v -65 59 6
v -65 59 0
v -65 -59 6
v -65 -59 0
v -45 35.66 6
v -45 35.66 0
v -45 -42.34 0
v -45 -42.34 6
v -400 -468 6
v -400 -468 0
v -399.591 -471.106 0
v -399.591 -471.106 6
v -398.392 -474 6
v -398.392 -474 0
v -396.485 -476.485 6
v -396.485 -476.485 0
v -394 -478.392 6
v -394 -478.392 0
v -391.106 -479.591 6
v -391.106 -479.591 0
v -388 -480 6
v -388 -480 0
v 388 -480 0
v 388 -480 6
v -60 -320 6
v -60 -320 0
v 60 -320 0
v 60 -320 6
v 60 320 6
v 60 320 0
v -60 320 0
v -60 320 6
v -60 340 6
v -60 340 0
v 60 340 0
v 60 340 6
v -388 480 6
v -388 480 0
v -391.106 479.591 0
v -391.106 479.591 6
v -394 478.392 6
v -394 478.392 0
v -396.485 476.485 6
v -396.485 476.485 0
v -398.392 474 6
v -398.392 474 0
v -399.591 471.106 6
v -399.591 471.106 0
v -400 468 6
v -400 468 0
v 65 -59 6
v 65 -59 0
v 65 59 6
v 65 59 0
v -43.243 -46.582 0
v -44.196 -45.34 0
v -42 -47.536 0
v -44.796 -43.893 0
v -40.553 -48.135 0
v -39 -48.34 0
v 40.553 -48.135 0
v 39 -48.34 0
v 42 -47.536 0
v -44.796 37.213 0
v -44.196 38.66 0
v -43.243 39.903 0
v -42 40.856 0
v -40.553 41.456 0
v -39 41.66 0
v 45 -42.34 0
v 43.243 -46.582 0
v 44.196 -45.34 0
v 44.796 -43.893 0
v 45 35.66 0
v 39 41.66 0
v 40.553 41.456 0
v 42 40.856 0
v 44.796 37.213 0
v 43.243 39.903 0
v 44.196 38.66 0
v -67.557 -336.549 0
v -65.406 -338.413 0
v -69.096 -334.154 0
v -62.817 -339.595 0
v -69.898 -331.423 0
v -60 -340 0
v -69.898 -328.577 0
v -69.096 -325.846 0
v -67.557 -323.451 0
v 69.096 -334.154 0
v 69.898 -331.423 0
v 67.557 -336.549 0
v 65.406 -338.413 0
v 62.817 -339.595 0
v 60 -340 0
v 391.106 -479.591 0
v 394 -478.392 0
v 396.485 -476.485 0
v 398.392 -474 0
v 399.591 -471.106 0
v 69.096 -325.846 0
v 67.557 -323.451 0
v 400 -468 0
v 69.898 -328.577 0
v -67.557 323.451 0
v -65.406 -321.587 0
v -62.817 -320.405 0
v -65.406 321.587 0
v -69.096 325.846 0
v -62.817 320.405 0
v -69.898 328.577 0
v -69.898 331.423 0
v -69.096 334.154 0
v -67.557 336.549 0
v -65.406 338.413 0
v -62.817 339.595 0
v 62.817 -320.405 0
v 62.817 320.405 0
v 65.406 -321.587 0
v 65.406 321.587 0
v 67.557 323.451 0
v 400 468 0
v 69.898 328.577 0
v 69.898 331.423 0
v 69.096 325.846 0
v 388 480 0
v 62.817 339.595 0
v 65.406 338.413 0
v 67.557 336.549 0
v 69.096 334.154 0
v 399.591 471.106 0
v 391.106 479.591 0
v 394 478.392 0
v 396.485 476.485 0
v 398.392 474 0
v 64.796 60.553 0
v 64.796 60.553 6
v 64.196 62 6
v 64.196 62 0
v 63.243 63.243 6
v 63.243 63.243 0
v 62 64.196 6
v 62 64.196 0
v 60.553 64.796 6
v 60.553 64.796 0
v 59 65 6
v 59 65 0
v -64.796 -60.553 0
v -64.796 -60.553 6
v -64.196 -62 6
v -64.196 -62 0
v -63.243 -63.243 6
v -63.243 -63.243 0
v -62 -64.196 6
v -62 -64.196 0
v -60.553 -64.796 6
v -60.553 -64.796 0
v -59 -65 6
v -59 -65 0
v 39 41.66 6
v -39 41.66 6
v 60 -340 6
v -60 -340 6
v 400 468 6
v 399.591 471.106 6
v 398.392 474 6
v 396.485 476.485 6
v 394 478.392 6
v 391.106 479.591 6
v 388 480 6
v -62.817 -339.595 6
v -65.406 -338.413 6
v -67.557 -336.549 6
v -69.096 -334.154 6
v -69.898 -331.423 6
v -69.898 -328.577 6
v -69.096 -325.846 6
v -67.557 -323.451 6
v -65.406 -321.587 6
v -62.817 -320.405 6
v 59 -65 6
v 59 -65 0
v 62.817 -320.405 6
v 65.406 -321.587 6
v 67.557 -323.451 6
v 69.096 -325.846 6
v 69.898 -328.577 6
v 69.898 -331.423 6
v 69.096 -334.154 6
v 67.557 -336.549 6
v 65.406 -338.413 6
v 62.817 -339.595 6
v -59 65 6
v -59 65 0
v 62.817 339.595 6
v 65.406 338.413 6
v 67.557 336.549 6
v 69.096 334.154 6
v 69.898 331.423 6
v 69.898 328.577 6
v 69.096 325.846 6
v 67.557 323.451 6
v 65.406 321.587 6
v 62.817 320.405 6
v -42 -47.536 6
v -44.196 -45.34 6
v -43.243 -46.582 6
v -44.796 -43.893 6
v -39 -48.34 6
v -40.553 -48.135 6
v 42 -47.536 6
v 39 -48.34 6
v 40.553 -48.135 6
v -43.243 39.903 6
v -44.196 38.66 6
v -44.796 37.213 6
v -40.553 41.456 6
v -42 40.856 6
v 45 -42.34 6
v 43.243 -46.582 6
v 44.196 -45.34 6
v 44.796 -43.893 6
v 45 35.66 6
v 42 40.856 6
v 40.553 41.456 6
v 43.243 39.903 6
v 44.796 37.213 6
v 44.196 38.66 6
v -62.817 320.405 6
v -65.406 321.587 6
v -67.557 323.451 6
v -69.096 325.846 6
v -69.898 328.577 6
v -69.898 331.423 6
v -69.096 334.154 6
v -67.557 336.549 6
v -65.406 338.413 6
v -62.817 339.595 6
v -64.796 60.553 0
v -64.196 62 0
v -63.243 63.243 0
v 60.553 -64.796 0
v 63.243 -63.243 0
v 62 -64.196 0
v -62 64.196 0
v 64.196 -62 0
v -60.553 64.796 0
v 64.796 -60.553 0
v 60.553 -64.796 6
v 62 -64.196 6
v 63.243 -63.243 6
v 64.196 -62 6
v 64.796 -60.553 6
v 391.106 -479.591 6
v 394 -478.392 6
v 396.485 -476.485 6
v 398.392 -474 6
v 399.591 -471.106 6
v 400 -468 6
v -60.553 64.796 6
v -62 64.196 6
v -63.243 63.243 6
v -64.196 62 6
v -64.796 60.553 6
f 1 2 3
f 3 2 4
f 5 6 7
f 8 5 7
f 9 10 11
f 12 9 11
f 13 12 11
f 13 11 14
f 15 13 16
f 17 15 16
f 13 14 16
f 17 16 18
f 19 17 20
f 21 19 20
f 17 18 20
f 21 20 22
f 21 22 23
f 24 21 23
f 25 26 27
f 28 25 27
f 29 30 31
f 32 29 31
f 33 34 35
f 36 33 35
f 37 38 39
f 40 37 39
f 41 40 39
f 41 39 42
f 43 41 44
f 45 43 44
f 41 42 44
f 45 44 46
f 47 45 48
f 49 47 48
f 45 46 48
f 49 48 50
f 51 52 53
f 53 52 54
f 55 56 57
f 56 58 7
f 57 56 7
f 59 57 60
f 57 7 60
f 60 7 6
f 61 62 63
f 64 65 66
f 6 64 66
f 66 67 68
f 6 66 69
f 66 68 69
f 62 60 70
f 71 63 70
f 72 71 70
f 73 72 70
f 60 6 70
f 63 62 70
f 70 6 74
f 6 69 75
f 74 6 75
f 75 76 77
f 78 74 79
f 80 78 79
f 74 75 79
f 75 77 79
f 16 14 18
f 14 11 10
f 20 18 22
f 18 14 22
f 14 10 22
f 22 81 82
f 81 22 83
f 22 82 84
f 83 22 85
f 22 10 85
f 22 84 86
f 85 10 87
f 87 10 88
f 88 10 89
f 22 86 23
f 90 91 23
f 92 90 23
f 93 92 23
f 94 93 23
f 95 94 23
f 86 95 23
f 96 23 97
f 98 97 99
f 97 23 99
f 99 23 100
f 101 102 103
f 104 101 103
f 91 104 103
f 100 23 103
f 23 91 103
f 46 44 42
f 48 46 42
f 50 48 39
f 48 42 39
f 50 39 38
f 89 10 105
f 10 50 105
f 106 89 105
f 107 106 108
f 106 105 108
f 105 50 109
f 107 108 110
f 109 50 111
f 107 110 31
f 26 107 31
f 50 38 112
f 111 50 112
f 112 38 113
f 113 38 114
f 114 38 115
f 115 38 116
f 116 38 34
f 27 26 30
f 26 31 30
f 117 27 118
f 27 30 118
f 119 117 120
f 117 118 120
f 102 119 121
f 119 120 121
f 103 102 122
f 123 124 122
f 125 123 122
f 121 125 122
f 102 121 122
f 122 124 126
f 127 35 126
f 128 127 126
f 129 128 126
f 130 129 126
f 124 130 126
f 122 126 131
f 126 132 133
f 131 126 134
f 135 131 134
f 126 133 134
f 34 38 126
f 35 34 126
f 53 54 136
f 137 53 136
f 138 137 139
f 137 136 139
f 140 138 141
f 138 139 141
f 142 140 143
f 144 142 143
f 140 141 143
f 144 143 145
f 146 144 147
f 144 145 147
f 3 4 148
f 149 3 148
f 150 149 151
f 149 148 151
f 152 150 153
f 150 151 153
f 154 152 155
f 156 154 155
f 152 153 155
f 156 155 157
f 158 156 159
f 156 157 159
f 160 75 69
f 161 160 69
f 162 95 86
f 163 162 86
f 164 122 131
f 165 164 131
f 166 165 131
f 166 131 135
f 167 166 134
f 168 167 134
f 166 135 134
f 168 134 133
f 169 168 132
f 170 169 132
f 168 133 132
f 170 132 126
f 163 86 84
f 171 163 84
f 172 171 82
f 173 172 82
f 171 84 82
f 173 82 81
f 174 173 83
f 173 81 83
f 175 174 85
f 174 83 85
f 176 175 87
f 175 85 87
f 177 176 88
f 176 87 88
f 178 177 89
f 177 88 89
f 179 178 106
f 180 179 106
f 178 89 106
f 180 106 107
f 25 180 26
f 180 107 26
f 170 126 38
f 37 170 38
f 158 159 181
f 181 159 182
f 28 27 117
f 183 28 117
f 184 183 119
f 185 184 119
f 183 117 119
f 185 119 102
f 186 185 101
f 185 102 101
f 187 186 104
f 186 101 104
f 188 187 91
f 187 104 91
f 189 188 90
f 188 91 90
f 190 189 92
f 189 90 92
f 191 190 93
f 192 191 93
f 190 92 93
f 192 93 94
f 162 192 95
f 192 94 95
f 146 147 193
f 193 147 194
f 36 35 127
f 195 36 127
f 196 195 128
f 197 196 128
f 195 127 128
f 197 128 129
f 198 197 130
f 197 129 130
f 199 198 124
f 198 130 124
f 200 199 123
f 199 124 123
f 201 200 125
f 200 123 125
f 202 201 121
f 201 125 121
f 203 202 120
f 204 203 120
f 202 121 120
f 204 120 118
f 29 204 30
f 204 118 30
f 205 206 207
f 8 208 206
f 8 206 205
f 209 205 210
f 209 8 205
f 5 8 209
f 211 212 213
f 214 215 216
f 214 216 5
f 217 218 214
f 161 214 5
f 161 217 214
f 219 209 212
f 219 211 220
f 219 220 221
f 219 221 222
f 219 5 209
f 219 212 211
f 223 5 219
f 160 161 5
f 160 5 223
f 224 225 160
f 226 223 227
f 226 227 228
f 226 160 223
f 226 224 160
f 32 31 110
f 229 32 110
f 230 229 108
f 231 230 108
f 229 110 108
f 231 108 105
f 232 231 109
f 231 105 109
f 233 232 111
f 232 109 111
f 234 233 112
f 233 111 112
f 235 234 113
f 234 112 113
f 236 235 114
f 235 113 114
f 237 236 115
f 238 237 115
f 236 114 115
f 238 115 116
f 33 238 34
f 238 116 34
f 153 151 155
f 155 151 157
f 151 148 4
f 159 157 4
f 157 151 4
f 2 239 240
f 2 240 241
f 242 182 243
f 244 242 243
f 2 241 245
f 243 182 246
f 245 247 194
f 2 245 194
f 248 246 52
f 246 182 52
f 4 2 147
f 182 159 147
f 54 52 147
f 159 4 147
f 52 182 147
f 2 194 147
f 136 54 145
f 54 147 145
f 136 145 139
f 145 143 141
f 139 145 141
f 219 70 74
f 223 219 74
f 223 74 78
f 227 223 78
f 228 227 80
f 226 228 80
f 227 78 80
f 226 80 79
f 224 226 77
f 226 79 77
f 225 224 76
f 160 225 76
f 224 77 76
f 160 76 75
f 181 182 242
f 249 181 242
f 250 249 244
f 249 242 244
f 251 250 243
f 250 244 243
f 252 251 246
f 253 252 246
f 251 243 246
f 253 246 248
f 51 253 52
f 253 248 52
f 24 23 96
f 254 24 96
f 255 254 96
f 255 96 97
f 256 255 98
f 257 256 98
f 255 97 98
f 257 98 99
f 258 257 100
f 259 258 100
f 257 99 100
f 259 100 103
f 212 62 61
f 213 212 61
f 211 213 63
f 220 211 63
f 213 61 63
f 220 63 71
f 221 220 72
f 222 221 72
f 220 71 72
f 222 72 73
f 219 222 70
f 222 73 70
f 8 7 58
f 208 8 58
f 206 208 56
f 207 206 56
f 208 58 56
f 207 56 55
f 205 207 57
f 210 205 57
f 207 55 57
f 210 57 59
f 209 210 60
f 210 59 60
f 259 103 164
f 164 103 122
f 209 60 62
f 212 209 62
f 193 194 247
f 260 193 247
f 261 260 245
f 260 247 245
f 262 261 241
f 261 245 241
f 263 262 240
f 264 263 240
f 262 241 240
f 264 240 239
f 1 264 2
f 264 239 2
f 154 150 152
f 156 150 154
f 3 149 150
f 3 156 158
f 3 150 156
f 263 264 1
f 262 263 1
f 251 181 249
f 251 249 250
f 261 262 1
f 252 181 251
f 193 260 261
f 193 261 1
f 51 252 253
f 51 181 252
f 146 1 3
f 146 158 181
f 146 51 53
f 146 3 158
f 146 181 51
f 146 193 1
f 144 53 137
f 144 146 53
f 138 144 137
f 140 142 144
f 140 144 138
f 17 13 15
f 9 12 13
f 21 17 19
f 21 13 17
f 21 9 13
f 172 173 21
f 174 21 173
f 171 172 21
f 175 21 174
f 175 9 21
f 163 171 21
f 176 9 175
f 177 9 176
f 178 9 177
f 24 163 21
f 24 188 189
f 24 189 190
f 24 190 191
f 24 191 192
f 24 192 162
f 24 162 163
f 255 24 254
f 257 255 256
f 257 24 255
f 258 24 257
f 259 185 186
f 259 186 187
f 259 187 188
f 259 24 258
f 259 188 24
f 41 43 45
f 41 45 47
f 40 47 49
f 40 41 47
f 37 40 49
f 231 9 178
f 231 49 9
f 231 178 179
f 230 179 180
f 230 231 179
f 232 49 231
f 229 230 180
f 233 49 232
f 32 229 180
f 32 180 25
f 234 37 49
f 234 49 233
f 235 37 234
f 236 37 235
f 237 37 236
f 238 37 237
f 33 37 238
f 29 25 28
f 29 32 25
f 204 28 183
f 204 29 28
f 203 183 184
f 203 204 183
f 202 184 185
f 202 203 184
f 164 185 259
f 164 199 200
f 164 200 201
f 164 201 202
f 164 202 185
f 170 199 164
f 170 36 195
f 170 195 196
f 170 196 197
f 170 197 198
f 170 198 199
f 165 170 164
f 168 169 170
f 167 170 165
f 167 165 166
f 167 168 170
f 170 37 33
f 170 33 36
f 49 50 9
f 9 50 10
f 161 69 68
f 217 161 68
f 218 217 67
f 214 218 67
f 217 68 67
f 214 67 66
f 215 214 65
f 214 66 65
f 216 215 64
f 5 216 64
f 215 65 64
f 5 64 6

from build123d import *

# Parameters (mm, degrees)
F1_DEPTH = 6
F3_DEPTH = 6
F5_DEPTH = 6


with BuildPart() as f1:
    # F0 (on Top) → F1 (new body)
    with BuildSketch(Plane.XY):
        with BuildLine():
            Line((39, 41.660154), (-39, 41.660154))
            ThreePointArc((-39, 41.660154), (-43.242641, 39.902795), (-45, 35.660154))
            Line((-45, 35.660154), (-45, -42.339846))
            ThreePointArc((-45, -42.339846), (-43.242641, -46.582486), (-39, -48.339846))
            Line((-39, -48.339846), (39, -48.339846))
            ThreePointArc((39, -48.339846), (43.242641, -46.582486), (45, -42.339846))
            Line((45, -42.339846), (45, 35.660154))
            ThreePointArc((45, 35.660154), (43.242641, 39.902795), (39, 41.660154))
        make_face()
    extrude(amount=F1_DEPTH)


with BuildPart() as f3:
    # F2 (on Top) → F3 (new body)
    with BuildSketch(Plane.XY):
        with BuildLine():
            ThreePointArc((65, 59), (63.242641, 63.242641), (59, 65))
            Line((59, 65), (-59, 65))
            ThreePointArc((-59, 65), (-63.242641, 63.242641), (-65, 59))
            Line((-65, 59), (-65, -59))
            ThreePointArc((-65, -59), (-63.242641, -63.242641), (-59, -65))
            Line((-59, -65), (59, -65))
            ThreePointArc((59, -65), (63.242641, -63.242641), (65, -59))
            Line((65, -59), (65, 59))
        make_face()
    extrude(amount=F3_DEPTH)


with BuildPart() as f5:
    # F4 (on Top) → F5 (new body)
    with BuildSketch(Plane.XY):
        with BuildLine():
            Line((388, 480), (-388, 480))
            ThreePointArc((-388, 480), (-396.485281, 476.485281), (-400, 468))
            Line((-400, 468), (-400, -468))
            ThreePointArc((-400, -468), (-396.485281, -476.485281), (-388, -480))
            Line((-388, -480), (388, -480))
            ThreePointArc((388, -480), (396.485281, -476.485281), (400, -468))
            Line((400, -468), (400, 468))
            ThreePointArc((400, 468), (396.485281, 476.485281), (388, 480))
        make_face()
        with BuildLine():
            Line((60, -340), (-60, -340))
            ThreePointArc((-60, -340), (-70, -330), (-60, -320))
            Line((-60, -320), (60, -320))
            ThreePointArc((60, -320), (70, -330), (60, -340))
        make_face(mode=Mode.SUBTRACT)
        with BuildLine():
            ThreePointArc((-60, 320), (-70, 330), (-60, 340))
            Line((-60, 340), (60, 340))
            ThreePointArc((60, 340), (70, 330), (60, 320))
            Line((60, 320), (-60, 320))
        make_face(mode=Mode.SUBTRACT)
    extrude(amount=F5_DEPTH)


solid = Compound([f1.part, f3.part, f5.part])
